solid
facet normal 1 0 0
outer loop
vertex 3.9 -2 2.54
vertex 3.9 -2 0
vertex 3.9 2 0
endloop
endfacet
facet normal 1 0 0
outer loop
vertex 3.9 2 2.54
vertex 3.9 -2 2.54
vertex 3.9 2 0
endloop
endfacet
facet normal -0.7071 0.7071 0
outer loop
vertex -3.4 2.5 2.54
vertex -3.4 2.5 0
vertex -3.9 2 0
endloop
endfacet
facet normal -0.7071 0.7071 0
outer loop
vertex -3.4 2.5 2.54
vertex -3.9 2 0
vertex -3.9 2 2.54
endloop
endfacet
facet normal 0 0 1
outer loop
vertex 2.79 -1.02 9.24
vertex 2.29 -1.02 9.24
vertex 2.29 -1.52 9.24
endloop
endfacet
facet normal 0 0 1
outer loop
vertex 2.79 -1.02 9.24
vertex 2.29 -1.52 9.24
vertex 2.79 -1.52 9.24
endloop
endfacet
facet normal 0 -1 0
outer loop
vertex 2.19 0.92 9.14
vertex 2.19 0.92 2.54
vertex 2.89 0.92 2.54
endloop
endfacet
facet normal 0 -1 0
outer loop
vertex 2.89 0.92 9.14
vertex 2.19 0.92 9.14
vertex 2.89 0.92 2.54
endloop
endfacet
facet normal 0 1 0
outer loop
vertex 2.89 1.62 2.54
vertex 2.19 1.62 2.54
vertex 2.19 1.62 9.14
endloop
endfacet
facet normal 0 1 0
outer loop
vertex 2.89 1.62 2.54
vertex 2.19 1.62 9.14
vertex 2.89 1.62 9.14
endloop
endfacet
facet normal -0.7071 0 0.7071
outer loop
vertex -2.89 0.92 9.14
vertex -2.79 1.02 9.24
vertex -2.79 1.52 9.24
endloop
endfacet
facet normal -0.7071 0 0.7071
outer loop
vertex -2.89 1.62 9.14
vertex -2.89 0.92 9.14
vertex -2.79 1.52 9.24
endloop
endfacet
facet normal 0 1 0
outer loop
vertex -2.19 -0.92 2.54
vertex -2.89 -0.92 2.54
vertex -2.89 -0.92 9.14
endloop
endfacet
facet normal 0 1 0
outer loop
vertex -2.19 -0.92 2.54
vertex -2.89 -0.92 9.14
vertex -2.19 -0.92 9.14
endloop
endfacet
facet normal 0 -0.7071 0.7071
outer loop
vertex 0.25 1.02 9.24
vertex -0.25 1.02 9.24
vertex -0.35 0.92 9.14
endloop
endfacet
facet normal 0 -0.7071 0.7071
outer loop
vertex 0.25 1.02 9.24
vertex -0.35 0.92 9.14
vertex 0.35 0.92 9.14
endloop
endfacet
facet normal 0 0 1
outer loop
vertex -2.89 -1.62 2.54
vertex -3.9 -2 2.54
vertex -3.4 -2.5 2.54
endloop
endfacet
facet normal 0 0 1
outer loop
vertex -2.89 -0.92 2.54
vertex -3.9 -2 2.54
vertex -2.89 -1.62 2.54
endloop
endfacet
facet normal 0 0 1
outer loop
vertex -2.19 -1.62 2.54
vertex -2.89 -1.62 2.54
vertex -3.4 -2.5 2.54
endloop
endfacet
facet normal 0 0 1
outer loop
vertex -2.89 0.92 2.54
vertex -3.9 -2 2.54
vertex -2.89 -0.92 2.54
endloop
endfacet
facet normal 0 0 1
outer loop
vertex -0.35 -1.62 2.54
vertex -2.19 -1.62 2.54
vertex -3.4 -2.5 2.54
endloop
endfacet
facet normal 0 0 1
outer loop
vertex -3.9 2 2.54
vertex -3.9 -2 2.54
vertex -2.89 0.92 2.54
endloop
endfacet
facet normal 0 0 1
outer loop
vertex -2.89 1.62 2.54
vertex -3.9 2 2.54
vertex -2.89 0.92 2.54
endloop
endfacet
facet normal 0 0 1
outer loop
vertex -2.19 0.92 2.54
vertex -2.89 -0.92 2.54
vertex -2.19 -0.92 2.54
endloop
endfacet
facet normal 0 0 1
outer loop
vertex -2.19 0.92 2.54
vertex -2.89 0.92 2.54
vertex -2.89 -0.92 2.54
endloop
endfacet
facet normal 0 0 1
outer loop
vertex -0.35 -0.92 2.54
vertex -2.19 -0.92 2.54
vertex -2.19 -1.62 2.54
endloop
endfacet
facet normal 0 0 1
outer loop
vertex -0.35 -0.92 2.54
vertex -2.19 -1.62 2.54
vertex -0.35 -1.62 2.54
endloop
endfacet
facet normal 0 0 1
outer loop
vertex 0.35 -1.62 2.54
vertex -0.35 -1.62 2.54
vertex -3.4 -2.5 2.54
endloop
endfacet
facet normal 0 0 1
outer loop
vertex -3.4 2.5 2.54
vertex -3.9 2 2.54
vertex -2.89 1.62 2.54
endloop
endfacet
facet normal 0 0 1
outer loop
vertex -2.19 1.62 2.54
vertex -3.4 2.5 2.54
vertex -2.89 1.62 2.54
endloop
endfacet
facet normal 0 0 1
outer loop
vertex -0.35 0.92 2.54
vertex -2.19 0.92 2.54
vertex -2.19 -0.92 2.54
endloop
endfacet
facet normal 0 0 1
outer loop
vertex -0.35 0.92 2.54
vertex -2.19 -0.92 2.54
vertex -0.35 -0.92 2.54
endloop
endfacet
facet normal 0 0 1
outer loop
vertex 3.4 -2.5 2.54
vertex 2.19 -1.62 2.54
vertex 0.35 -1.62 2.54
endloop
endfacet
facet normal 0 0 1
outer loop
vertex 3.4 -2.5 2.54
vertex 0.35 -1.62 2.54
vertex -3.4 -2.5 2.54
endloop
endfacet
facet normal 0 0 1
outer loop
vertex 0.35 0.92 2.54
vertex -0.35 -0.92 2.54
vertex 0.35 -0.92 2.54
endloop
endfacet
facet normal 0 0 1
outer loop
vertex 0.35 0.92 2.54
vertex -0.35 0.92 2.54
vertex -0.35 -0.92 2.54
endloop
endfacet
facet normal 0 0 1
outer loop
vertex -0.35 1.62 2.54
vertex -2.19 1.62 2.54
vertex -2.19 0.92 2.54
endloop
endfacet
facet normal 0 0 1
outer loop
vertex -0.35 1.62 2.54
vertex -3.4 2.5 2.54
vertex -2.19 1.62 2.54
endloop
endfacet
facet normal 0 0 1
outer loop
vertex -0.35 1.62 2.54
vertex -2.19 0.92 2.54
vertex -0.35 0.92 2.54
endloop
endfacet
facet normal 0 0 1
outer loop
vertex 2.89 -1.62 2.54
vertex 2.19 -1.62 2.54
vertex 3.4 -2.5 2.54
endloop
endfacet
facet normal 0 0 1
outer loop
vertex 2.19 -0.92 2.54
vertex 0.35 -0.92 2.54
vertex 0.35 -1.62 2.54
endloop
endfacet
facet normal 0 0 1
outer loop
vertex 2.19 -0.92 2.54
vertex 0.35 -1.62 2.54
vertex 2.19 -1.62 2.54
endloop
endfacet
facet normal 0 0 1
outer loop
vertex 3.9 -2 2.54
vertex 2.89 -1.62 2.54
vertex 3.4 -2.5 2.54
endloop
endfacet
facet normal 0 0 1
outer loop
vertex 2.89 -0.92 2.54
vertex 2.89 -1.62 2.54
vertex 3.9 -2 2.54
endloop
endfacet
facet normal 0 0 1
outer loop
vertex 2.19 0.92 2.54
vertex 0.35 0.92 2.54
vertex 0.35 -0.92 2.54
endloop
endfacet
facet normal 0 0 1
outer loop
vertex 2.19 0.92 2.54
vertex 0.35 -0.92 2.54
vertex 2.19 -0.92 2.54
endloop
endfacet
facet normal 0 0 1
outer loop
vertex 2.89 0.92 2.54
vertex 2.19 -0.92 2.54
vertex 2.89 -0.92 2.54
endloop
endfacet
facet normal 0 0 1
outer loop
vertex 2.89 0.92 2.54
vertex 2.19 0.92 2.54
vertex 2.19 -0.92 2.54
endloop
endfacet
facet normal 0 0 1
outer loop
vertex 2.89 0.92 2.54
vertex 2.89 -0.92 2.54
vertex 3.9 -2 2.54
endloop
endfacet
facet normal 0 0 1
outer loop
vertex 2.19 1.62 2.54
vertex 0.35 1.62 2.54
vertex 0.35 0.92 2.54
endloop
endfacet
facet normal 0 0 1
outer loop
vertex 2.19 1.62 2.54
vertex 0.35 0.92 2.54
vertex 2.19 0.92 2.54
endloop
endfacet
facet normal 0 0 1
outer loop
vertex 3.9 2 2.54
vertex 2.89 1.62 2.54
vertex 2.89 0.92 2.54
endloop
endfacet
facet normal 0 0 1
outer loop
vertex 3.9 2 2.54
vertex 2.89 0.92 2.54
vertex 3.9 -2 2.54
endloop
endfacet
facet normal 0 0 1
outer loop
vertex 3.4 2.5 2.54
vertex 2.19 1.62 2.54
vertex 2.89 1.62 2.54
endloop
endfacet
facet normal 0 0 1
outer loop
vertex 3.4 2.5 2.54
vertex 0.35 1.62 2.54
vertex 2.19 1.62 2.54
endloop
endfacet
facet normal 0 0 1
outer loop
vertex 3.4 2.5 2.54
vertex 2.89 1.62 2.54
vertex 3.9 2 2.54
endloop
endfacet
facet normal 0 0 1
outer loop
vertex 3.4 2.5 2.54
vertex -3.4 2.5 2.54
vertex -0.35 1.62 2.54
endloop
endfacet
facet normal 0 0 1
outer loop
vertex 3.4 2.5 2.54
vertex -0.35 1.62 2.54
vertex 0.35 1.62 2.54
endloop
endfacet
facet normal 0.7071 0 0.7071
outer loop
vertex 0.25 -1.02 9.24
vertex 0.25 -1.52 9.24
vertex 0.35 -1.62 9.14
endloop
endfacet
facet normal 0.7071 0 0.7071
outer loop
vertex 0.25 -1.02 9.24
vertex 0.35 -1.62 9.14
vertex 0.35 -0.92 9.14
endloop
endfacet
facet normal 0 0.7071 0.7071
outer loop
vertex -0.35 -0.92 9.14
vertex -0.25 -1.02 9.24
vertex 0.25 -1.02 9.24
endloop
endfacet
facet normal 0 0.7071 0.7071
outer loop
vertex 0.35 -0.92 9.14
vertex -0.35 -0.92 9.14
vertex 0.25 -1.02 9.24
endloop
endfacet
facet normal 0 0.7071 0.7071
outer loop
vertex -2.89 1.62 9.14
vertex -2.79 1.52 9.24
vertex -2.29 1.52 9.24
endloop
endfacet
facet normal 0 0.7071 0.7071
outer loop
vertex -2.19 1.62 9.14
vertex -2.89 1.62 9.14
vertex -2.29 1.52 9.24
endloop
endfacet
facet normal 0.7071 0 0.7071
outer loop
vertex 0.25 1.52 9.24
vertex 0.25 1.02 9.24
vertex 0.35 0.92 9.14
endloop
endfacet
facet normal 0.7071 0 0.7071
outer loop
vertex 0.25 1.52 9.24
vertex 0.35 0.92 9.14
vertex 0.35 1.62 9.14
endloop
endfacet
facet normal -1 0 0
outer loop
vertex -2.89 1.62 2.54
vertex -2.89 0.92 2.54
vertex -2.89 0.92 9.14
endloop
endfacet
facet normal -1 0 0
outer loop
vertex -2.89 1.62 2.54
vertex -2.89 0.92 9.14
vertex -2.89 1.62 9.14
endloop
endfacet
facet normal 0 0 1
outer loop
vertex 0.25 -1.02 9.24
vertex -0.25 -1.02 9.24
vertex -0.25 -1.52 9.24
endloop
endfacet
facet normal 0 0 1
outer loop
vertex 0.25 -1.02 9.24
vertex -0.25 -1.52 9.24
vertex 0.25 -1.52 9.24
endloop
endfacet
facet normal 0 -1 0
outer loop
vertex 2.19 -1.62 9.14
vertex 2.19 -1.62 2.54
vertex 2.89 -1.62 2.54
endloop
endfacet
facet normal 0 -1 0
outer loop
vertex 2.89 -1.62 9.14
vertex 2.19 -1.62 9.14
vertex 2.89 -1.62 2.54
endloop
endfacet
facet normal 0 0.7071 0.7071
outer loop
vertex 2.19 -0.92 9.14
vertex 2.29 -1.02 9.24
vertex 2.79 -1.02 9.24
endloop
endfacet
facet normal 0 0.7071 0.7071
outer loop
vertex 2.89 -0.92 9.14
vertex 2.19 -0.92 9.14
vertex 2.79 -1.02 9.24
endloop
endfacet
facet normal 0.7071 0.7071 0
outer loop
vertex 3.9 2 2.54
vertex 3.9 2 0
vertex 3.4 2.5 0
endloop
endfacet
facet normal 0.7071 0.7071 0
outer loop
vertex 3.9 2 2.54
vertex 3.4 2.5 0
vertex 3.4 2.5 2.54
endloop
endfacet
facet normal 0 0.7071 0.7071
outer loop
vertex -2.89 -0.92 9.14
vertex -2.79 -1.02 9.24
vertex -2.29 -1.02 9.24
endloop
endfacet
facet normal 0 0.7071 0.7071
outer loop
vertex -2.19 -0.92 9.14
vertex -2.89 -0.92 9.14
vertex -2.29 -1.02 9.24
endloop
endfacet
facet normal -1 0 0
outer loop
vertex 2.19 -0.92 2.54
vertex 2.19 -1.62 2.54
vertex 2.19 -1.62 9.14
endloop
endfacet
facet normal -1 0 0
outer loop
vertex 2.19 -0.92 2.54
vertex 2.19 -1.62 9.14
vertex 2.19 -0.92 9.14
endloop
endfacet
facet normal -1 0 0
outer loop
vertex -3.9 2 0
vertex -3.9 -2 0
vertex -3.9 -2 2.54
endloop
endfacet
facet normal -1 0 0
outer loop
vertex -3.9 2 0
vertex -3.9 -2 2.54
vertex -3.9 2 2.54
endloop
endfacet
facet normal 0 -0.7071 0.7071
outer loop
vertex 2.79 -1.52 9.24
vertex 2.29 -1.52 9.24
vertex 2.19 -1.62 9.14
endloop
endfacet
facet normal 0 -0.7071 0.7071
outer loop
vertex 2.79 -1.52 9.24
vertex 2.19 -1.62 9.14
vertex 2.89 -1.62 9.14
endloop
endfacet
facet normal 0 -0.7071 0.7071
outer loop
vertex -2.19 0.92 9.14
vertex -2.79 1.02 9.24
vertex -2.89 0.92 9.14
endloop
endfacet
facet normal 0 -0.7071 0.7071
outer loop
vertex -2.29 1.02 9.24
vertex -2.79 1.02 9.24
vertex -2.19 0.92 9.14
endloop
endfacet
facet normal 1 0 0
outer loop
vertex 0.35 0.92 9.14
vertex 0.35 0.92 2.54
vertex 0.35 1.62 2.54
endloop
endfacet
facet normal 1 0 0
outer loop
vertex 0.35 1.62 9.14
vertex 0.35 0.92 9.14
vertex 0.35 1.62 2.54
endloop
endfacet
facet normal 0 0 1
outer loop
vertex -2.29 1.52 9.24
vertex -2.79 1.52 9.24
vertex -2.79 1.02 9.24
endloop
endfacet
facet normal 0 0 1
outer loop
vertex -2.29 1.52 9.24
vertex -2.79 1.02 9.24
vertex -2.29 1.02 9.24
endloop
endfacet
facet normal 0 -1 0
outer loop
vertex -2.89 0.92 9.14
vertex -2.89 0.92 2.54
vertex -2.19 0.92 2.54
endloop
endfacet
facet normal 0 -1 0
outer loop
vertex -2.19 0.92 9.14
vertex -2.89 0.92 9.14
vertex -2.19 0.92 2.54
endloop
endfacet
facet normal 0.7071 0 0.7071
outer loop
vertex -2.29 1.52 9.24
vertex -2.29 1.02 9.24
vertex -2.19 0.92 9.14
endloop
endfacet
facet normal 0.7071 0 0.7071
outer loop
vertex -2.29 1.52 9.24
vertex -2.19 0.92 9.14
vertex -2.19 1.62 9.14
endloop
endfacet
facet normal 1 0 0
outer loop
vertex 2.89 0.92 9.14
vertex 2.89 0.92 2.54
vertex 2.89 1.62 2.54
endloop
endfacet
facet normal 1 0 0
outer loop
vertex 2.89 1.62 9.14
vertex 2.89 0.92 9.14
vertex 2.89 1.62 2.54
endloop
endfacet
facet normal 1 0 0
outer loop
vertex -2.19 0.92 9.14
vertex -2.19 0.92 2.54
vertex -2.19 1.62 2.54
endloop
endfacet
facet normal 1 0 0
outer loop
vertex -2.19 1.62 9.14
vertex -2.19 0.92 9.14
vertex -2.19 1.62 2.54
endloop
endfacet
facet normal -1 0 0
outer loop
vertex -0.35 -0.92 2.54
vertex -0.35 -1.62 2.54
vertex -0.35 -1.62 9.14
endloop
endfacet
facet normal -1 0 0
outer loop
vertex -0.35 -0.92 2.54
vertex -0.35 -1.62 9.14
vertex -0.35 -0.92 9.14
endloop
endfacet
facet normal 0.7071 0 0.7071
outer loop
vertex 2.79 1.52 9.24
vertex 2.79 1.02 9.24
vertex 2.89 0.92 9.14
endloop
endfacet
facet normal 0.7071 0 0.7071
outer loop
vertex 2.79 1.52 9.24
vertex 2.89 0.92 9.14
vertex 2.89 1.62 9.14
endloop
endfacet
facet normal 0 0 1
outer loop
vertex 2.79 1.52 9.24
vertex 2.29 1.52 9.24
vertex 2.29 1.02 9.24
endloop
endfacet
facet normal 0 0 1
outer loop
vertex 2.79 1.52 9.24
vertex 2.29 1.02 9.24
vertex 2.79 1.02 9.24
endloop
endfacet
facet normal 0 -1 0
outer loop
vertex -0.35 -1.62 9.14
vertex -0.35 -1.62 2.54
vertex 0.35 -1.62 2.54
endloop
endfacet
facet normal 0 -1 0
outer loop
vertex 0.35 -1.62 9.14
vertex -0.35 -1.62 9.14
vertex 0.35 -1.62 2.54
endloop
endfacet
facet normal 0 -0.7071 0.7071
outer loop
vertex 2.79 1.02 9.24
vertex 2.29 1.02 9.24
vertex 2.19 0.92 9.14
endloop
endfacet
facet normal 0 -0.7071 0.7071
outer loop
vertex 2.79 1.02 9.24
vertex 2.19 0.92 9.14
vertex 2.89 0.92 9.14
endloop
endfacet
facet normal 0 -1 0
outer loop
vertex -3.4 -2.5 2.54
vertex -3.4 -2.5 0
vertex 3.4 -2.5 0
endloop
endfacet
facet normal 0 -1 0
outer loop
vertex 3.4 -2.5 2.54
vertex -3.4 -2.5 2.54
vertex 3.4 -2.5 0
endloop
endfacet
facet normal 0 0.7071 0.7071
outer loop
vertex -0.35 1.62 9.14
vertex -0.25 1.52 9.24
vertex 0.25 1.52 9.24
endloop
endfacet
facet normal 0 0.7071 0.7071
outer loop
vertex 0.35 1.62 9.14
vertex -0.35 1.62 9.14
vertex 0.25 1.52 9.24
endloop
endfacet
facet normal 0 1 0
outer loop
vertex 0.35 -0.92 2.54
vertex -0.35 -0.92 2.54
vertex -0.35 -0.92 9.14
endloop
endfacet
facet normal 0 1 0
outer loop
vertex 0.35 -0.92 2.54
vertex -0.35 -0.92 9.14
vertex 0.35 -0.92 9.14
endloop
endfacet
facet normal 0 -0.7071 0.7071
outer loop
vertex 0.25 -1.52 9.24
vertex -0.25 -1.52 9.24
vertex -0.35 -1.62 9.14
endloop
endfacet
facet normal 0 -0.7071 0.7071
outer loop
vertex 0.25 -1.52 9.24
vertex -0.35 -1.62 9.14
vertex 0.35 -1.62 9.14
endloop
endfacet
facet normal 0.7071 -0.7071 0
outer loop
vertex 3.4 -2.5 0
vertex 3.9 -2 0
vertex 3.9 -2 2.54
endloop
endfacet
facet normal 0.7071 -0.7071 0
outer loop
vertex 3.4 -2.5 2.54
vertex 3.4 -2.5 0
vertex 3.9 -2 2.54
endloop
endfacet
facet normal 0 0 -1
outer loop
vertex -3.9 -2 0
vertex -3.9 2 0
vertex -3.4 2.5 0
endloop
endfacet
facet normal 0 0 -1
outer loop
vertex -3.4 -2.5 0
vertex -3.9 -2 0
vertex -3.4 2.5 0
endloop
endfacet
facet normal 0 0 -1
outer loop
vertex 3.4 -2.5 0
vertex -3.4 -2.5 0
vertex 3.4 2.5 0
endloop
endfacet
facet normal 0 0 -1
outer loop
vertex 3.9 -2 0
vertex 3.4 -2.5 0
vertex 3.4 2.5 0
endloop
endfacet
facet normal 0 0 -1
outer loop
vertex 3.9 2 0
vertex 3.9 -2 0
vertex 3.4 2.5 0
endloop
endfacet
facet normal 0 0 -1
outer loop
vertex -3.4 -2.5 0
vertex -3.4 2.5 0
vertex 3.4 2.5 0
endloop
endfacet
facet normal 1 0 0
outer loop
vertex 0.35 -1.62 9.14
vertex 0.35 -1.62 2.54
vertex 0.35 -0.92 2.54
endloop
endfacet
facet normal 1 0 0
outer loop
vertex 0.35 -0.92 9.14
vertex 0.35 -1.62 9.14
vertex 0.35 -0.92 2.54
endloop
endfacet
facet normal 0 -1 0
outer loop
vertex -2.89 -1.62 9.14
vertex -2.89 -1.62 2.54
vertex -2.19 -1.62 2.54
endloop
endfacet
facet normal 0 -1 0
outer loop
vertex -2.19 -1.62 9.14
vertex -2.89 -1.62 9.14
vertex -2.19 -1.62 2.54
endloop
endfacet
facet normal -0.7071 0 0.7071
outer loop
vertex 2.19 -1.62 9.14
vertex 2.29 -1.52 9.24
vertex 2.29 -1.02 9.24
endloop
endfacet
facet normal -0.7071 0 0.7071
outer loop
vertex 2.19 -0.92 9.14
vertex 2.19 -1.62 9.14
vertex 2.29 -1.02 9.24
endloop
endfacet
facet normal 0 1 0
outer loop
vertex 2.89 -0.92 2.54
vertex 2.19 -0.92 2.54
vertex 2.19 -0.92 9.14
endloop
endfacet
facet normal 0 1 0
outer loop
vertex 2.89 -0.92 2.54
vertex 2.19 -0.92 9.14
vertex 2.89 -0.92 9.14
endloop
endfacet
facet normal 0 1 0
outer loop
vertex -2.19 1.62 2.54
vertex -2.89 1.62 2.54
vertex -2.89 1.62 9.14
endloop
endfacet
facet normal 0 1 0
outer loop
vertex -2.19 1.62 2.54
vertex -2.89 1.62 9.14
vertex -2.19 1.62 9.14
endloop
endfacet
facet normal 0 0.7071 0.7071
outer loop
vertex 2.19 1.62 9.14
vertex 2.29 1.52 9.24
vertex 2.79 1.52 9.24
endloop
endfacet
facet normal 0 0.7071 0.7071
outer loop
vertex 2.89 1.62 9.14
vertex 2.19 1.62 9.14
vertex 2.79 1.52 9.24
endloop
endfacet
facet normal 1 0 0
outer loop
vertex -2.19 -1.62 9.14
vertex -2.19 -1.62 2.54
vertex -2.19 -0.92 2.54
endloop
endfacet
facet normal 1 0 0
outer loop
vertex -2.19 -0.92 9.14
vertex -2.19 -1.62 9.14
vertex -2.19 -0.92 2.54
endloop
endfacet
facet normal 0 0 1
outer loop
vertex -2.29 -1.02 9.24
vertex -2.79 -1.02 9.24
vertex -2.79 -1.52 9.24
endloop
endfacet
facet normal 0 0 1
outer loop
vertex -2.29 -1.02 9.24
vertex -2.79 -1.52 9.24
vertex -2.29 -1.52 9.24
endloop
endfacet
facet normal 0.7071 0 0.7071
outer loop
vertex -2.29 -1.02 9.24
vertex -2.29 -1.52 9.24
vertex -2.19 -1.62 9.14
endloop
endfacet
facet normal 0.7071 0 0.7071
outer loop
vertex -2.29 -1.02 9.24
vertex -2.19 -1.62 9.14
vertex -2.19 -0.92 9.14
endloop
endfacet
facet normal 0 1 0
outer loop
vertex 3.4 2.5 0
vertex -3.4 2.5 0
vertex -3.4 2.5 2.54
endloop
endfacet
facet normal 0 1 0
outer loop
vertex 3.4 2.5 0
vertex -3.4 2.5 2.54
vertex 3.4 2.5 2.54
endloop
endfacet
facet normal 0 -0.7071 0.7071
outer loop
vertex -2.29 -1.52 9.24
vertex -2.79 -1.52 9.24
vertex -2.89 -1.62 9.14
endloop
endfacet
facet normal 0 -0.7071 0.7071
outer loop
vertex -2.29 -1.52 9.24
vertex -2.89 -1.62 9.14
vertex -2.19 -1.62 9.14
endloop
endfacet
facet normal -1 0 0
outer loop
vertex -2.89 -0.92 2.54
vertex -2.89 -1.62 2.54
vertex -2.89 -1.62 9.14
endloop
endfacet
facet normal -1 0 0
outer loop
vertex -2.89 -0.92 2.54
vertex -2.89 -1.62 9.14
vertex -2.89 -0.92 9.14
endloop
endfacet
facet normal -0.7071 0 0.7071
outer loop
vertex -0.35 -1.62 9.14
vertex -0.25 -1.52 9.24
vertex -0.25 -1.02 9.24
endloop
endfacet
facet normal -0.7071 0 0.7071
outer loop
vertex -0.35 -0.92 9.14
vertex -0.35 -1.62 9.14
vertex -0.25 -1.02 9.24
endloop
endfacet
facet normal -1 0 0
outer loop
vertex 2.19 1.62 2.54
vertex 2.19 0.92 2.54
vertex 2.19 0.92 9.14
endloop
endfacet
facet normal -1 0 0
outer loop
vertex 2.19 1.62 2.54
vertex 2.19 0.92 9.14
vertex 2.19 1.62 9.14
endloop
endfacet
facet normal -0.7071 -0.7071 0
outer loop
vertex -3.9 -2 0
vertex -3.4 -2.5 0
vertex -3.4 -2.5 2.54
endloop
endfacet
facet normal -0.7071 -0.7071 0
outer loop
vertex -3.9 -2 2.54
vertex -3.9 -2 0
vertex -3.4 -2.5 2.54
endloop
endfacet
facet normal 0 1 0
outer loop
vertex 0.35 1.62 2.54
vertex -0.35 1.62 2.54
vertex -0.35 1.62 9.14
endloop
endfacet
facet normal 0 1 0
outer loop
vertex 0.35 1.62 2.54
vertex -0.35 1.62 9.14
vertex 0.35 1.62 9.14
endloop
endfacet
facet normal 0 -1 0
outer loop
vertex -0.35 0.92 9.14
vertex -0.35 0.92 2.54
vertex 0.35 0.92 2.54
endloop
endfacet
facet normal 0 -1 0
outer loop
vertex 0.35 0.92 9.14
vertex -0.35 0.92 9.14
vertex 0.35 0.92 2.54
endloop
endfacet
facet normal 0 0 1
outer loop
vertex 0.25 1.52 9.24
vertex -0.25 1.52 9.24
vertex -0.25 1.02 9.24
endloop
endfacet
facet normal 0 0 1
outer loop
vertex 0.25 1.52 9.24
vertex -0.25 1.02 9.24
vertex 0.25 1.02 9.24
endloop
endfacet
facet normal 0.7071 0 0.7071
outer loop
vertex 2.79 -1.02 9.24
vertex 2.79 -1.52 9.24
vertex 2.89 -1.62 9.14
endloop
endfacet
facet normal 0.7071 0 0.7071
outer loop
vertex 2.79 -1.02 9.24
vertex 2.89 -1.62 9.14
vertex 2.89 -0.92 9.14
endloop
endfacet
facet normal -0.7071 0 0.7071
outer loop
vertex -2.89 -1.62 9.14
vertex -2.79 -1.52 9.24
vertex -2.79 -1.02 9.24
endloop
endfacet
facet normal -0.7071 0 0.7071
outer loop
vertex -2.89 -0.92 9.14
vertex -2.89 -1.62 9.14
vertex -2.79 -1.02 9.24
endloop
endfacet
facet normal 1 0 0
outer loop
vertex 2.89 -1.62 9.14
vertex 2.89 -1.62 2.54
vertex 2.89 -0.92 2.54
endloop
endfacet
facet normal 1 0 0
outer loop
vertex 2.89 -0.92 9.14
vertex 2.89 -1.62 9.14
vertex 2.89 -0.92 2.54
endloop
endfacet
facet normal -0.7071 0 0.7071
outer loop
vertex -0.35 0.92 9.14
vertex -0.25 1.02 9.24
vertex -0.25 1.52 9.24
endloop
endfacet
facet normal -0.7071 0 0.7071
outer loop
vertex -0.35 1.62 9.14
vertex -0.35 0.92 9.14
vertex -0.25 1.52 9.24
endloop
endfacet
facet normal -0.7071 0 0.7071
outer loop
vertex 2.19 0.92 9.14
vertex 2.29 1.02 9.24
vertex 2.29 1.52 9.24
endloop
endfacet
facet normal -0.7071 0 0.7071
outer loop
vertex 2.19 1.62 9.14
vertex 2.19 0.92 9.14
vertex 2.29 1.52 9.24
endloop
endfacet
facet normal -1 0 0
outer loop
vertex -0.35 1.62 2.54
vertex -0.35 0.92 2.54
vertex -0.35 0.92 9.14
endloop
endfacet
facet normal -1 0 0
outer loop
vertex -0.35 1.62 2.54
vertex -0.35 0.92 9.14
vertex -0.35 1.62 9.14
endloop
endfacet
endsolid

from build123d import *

# Parameters (mm, degrees)
SKETCH1_W           = 7.8
SKETCH1_H           = 5
BOSS_EXTRUDE1_DEPTH = 2.54
SKETCH2_W           = 0.7
SKETCH2_H           = 0.7
BOSS_EXTRUDE2_DEPTH = 6.7
CHAMFER1_SIZE       = 0.5
CHAMFER2_SIZE       = 0.1


with BuildPart() as part:
    # Sketch1 → Boss-Extrude1 (new body)
    with BuildSketch(Plane.XY):
        Rectangle(SKETCH1_W, SKETCH1_H)
    extrude(amount=BOSS_EXTRUDE1_DEPTH)

    # Sketch2 → Boss-Extrude2 (add)
    with BuildSketch(Plane.XY.offset(2.54)):
        with Locations((0, 1.27)):
            Rectangle(SKETCH2_W, SKETCH2_H)
        with Locations((-2.54, 1.27)):
            Rectangle(SKETCH2_W, SKETCH2_H)
        with Locations((2.54, 1.27)):
            Rectangle(SKETCH2_W, SKETCH2_H)
        with Locations((0, -1.27)):
            Rectangle(SKETCH2_W, SKETCH2_H)
        with Locations((2.54, -1.27)):
            Rectangle(SKETCH2_W, SKETCH2_H)
        with Locations((-2.54, -1.27)):
            Rectangle(SKETCH2_W, SKETCH2_H)
    extrude(amount=BOSS_EXTRUDE2_DEPTH)

    # Chamfer1
    chamfer1_edges = [part.edges().sort_by_distance(p)[0] for p in [
        (3.9, -2.5, 1.27),
        (-3.9, -2.5, 1.27),
        (-3.9, 2.5, 1.27),
        (3.9, 2.5, 1.27),
    ]]
    chamfer(chamfer1_edges, length=CHAMFER1_SIZE)

    # Chamfer2
    chamfer2_edges = [part.edges().sort_by_distance(p)[0] for p in [
        (-2.89, 1.27, 9.24),
        (-2.54, 0.92, 9.24),
        (-2.19, 1.27, 9.24),
        (-2.54, 1.62, 9.24),
        (-0.35, 1.27, 9.24),
        (0, 0.92, 9.24),
        (0.35, 1.27, 9.24),
        (0, 1.62, 9.24),
        (2.19, 1.27, 9.24),
        (2.54, 0.92, 9.24),
        (2.89, 1.27, 9.24),
        (2.54, 1.62, 9.24),
        (-0.35, -1.27, 9.24),
        (0, -1.62, 9.24),
        (0.35, -1.27, 9.24),
        (0, -0.92, 9.24),
        (2.19, -1.27, 9.24),
        (2.54, -1.62, 9.24),
        (2.89, -1.27, 9.24),
        (2.54, -0.92, 9.24),
        (-2.89, -1.27, 9.24),
        (-2.54, -1.62, 9.24),
        (-2.19, -1.27, 9.24),
        (-2.54, -0.92, 9.24),
    ]]
    chamfer(chamfer2_edges, length=CHAMFER2_SIZE)


solid = part.part
